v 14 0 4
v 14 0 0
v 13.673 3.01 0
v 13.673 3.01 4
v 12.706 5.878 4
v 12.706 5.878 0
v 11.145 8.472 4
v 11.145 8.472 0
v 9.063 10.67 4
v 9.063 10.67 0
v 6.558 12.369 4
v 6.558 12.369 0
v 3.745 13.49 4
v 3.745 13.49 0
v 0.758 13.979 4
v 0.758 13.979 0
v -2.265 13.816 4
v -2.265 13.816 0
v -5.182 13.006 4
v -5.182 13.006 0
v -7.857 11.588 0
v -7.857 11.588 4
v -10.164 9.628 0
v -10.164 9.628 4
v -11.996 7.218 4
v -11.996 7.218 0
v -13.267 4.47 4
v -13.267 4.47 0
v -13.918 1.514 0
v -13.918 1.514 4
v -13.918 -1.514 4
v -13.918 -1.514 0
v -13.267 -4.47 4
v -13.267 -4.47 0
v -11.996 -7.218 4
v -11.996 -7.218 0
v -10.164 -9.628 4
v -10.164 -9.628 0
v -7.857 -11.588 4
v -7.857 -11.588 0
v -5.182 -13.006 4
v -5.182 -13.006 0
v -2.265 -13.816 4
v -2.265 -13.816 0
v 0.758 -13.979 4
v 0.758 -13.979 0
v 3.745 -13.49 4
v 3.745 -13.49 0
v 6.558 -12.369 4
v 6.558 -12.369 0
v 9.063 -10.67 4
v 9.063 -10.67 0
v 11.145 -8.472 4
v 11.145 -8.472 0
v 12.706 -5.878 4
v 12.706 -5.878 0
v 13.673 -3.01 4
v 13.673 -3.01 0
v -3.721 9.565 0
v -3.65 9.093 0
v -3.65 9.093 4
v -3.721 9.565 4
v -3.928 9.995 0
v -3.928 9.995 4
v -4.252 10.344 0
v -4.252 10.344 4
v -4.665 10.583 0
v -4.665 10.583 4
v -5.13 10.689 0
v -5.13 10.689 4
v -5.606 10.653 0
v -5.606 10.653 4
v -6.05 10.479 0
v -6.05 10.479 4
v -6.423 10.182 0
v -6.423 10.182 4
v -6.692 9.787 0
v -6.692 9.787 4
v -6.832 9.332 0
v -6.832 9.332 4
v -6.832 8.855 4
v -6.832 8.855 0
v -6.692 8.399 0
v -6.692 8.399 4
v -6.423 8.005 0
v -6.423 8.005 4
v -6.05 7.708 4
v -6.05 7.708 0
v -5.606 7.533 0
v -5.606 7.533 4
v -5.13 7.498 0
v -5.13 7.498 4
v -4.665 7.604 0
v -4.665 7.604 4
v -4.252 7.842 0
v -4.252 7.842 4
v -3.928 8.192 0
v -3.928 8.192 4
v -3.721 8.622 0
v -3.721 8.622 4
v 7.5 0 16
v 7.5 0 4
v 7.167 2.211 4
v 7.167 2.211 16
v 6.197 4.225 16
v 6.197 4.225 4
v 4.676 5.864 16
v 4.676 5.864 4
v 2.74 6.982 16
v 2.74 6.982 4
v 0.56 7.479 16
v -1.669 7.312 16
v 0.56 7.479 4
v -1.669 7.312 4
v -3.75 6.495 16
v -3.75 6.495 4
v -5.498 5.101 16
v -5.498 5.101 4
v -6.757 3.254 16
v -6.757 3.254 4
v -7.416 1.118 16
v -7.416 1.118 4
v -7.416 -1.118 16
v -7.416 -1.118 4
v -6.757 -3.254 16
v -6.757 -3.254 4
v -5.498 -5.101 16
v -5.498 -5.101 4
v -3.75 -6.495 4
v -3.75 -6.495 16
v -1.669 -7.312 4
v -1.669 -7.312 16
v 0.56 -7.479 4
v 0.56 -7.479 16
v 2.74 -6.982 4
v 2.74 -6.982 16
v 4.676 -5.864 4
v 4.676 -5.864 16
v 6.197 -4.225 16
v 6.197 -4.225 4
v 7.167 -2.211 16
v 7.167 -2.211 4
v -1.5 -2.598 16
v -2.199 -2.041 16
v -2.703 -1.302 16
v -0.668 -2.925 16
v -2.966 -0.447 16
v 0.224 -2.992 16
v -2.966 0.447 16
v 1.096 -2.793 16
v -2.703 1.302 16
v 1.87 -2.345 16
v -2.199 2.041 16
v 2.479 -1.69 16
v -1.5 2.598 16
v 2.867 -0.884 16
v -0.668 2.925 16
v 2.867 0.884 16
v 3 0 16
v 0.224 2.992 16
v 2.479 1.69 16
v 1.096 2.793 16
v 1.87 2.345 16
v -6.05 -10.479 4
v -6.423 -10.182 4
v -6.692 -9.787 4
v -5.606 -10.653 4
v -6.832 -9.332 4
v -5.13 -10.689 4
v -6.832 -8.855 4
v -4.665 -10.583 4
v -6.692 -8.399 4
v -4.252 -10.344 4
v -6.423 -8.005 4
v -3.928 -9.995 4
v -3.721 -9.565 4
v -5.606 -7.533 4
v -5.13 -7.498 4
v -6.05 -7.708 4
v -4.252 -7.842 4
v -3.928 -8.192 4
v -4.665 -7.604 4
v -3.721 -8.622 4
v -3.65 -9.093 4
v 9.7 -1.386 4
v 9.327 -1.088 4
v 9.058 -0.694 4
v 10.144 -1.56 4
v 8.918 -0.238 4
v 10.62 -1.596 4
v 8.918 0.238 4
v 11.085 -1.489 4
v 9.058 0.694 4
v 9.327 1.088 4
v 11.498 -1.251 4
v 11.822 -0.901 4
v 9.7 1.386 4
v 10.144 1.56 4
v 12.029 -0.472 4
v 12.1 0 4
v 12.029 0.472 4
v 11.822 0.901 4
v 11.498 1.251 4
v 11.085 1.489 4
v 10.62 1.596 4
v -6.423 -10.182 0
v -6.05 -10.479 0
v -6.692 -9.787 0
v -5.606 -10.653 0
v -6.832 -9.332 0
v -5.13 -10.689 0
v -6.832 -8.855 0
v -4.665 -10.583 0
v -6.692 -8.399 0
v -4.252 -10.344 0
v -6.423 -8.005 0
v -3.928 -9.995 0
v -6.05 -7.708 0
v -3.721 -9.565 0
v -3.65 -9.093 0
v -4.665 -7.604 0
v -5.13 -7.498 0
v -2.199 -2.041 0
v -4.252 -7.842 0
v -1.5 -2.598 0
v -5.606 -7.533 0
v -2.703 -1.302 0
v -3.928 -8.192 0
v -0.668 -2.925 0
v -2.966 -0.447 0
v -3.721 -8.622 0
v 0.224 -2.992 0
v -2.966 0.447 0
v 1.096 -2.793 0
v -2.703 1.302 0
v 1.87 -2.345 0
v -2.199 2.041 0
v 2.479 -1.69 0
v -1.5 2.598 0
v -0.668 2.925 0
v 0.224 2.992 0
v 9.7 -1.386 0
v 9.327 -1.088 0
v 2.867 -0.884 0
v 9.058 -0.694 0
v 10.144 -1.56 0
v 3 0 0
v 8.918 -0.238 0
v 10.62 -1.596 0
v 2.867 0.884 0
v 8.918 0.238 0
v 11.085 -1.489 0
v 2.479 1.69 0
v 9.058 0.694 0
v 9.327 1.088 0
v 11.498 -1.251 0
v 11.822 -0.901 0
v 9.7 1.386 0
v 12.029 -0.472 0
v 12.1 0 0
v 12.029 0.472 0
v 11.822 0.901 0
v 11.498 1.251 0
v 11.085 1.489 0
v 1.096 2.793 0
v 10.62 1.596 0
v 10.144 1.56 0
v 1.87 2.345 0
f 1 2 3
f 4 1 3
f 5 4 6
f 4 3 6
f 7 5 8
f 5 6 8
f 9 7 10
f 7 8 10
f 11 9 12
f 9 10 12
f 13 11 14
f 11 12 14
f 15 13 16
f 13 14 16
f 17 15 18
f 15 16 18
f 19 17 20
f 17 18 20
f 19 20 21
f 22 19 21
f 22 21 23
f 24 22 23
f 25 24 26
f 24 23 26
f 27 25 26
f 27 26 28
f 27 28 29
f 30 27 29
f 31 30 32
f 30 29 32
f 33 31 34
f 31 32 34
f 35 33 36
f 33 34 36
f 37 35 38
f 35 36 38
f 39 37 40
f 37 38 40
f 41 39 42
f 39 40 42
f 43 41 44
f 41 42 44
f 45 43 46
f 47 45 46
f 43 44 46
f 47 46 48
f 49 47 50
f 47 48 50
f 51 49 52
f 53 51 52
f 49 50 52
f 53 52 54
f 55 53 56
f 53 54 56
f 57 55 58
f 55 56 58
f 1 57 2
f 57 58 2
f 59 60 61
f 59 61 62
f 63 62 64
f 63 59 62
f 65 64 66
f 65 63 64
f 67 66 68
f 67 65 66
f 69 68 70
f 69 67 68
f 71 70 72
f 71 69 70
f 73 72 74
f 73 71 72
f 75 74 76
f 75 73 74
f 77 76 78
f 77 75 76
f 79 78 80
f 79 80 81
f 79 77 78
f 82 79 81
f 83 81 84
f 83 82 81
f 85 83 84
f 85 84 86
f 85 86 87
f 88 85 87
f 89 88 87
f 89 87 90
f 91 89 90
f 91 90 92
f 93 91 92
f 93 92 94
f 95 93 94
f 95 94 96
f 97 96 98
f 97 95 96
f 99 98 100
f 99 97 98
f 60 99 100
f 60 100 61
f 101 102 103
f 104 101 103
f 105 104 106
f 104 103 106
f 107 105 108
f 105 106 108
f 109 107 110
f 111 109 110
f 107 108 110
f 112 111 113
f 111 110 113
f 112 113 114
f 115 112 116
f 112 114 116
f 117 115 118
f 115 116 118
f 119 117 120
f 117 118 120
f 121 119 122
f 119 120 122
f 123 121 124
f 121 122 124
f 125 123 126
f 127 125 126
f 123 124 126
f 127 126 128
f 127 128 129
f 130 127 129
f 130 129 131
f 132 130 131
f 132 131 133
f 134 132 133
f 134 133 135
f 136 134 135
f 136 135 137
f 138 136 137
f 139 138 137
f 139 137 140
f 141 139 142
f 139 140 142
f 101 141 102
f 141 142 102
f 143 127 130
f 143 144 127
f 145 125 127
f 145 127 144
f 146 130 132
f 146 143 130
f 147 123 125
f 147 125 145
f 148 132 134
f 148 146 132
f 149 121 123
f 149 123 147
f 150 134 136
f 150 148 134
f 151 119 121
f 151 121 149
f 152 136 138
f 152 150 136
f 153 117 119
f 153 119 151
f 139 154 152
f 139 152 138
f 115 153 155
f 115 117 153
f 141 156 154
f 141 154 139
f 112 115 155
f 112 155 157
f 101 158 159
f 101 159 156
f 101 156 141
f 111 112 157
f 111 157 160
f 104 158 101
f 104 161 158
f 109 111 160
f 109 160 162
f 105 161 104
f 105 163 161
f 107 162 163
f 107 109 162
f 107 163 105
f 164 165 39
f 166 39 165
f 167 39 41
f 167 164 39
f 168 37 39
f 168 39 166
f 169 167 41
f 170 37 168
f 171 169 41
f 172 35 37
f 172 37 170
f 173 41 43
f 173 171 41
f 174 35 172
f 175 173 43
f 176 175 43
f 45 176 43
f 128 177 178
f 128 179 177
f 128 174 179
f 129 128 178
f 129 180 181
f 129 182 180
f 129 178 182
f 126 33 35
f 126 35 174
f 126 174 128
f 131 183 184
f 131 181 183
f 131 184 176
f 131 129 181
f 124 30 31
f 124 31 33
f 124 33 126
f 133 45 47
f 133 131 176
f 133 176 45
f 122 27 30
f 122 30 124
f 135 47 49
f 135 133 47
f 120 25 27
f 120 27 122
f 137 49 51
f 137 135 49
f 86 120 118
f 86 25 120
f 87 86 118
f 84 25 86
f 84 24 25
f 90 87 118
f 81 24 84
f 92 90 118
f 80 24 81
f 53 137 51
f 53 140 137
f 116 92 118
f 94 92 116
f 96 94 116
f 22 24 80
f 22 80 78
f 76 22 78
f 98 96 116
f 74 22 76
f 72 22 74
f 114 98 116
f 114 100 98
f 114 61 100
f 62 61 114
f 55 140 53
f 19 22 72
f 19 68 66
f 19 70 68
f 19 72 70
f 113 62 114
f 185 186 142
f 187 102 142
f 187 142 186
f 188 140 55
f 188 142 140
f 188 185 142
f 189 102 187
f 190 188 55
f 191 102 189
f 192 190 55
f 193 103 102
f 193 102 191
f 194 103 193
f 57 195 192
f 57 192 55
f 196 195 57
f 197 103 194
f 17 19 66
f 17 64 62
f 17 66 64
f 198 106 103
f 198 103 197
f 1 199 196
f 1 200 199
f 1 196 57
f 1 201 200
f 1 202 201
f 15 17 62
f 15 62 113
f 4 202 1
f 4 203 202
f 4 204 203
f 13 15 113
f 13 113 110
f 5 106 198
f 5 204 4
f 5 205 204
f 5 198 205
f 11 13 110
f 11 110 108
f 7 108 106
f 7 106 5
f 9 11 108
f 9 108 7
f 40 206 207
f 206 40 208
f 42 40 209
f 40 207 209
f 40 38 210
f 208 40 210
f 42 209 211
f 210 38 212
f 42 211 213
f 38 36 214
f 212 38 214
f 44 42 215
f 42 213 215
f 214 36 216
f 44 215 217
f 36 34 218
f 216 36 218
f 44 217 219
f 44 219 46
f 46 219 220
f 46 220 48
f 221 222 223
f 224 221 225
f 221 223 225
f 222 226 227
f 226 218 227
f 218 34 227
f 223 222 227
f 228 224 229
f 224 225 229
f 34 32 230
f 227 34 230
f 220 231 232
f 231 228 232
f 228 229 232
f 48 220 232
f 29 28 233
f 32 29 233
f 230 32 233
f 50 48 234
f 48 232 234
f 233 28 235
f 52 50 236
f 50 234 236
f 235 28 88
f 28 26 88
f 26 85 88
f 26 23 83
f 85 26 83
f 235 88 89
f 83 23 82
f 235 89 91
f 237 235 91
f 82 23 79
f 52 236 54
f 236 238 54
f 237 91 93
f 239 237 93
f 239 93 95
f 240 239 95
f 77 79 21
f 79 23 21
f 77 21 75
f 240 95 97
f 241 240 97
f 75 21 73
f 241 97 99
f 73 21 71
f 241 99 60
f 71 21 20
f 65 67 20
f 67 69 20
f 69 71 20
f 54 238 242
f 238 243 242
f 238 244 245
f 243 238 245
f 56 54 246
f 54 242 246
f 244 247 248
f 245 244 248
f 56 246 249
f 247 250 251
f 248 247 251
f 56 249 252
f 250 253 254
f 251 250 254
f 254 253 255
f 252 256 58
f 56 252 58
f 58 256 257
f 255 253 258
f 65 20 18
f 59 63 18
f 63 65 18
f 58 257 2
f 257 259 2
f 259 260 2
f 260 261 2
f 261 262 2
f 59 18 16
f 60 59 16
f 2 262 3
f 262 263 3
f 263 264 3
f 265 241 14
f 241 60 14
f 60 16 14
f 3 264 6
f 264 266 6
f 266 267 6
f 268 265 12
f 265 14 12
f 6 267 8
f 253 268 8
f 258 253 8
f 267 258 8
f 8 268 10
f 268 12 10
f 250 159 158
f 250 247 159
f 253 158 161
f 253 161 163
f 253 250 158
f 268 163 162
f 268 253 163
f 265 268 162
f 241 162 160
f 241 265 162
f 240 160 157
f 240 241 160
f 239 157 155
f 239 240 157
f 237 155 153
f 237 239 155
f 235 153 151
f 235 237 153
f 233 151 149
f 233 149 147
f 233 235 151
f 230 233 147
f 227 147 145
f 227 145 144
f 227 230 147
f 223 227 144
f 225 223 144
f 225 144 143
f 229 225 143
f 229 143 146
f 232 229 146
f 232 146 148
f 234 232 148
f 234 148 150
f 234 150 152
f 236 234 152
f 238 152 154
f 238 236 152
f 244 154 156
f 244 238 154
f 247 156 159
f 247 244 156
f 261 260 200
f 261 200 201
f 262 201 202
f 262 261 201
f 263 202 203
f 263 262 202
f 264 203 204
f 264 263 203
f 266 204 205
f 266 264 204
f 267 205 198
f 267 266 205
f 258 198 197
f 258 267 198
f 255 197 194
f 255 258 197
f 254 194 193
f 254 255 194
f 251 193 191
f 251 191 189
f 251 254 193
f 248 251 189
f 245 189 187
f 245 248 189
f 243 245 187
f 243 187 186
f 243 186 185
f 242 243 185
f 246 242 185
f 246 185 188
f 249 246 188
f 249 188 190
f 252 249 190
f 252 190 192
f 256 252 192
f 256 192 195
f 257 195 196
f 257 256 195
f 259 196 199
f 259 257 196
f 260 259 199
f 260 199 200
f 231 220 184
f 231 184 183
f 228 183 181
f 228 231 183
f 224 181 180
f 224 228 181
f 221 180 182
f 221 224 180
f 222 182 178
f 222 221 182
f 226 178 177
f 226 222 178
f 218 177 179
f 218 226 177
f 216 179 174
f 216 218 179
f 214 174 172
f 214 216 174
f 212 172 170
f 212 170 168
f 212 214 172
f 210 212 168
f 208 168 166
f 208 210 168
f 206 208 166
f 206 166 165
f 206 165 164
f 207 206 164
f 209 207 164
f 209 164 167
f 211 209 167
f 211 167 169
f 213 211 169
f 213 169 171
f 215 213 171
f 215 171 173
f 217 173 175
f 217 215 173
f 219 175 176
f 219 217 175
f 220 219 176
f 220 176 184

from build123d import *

# Parameters (mm, degrees)
SKETCH_1_R      = 14
SKETCH_1_R_2    = 1.6
SKETCH_1_R_3    = 3
EXTRUDE_2_DEPTH = 4
SKETCH_2_R      = 7.5
SKETCH_2_R_2    = 3
EXTRUDE_3_DEPTH = 12


with BuildPart() as part:
    # ｽｹｯﾁ1 → ﾎﾞｽ - 押し出し2 (new body)
    with BuildSketch(Plane.XY):
        Circle(SKETCH_1_R)
        with Locations((10.5, 0)):
            Circle(SKETCH_1_R_2, mode=Mode.SUBTRACT)
        with Locations((-5.25, 9.09326674)):
            Circle(SKETCH_1_R_2, mode=Mode.SUBTRACT)
        with Locations((-5.25, -9.09326674)):
            Circle(SKETCH_1_R_2, mode=Mode.SUBTRACT)
        Circle(SKETCH_1_R_3, mode=Mode.SUBTRACT)
    extrude(amount=EXTRUDE_2_DEPTH)

    # ｽｹｯﾁ2 → ﾎﾞｽ - 押し出し3 (add)
    with BuildSketch(Plane.XY.offset(4)):
        Circle(SKETCH_2_R)
        Circle(SKETCH_2_R_2, mode=Mode.SUBTRACT)
    extrude(amount=EXTRUDE_3_DEPTH)


solid = part.part
